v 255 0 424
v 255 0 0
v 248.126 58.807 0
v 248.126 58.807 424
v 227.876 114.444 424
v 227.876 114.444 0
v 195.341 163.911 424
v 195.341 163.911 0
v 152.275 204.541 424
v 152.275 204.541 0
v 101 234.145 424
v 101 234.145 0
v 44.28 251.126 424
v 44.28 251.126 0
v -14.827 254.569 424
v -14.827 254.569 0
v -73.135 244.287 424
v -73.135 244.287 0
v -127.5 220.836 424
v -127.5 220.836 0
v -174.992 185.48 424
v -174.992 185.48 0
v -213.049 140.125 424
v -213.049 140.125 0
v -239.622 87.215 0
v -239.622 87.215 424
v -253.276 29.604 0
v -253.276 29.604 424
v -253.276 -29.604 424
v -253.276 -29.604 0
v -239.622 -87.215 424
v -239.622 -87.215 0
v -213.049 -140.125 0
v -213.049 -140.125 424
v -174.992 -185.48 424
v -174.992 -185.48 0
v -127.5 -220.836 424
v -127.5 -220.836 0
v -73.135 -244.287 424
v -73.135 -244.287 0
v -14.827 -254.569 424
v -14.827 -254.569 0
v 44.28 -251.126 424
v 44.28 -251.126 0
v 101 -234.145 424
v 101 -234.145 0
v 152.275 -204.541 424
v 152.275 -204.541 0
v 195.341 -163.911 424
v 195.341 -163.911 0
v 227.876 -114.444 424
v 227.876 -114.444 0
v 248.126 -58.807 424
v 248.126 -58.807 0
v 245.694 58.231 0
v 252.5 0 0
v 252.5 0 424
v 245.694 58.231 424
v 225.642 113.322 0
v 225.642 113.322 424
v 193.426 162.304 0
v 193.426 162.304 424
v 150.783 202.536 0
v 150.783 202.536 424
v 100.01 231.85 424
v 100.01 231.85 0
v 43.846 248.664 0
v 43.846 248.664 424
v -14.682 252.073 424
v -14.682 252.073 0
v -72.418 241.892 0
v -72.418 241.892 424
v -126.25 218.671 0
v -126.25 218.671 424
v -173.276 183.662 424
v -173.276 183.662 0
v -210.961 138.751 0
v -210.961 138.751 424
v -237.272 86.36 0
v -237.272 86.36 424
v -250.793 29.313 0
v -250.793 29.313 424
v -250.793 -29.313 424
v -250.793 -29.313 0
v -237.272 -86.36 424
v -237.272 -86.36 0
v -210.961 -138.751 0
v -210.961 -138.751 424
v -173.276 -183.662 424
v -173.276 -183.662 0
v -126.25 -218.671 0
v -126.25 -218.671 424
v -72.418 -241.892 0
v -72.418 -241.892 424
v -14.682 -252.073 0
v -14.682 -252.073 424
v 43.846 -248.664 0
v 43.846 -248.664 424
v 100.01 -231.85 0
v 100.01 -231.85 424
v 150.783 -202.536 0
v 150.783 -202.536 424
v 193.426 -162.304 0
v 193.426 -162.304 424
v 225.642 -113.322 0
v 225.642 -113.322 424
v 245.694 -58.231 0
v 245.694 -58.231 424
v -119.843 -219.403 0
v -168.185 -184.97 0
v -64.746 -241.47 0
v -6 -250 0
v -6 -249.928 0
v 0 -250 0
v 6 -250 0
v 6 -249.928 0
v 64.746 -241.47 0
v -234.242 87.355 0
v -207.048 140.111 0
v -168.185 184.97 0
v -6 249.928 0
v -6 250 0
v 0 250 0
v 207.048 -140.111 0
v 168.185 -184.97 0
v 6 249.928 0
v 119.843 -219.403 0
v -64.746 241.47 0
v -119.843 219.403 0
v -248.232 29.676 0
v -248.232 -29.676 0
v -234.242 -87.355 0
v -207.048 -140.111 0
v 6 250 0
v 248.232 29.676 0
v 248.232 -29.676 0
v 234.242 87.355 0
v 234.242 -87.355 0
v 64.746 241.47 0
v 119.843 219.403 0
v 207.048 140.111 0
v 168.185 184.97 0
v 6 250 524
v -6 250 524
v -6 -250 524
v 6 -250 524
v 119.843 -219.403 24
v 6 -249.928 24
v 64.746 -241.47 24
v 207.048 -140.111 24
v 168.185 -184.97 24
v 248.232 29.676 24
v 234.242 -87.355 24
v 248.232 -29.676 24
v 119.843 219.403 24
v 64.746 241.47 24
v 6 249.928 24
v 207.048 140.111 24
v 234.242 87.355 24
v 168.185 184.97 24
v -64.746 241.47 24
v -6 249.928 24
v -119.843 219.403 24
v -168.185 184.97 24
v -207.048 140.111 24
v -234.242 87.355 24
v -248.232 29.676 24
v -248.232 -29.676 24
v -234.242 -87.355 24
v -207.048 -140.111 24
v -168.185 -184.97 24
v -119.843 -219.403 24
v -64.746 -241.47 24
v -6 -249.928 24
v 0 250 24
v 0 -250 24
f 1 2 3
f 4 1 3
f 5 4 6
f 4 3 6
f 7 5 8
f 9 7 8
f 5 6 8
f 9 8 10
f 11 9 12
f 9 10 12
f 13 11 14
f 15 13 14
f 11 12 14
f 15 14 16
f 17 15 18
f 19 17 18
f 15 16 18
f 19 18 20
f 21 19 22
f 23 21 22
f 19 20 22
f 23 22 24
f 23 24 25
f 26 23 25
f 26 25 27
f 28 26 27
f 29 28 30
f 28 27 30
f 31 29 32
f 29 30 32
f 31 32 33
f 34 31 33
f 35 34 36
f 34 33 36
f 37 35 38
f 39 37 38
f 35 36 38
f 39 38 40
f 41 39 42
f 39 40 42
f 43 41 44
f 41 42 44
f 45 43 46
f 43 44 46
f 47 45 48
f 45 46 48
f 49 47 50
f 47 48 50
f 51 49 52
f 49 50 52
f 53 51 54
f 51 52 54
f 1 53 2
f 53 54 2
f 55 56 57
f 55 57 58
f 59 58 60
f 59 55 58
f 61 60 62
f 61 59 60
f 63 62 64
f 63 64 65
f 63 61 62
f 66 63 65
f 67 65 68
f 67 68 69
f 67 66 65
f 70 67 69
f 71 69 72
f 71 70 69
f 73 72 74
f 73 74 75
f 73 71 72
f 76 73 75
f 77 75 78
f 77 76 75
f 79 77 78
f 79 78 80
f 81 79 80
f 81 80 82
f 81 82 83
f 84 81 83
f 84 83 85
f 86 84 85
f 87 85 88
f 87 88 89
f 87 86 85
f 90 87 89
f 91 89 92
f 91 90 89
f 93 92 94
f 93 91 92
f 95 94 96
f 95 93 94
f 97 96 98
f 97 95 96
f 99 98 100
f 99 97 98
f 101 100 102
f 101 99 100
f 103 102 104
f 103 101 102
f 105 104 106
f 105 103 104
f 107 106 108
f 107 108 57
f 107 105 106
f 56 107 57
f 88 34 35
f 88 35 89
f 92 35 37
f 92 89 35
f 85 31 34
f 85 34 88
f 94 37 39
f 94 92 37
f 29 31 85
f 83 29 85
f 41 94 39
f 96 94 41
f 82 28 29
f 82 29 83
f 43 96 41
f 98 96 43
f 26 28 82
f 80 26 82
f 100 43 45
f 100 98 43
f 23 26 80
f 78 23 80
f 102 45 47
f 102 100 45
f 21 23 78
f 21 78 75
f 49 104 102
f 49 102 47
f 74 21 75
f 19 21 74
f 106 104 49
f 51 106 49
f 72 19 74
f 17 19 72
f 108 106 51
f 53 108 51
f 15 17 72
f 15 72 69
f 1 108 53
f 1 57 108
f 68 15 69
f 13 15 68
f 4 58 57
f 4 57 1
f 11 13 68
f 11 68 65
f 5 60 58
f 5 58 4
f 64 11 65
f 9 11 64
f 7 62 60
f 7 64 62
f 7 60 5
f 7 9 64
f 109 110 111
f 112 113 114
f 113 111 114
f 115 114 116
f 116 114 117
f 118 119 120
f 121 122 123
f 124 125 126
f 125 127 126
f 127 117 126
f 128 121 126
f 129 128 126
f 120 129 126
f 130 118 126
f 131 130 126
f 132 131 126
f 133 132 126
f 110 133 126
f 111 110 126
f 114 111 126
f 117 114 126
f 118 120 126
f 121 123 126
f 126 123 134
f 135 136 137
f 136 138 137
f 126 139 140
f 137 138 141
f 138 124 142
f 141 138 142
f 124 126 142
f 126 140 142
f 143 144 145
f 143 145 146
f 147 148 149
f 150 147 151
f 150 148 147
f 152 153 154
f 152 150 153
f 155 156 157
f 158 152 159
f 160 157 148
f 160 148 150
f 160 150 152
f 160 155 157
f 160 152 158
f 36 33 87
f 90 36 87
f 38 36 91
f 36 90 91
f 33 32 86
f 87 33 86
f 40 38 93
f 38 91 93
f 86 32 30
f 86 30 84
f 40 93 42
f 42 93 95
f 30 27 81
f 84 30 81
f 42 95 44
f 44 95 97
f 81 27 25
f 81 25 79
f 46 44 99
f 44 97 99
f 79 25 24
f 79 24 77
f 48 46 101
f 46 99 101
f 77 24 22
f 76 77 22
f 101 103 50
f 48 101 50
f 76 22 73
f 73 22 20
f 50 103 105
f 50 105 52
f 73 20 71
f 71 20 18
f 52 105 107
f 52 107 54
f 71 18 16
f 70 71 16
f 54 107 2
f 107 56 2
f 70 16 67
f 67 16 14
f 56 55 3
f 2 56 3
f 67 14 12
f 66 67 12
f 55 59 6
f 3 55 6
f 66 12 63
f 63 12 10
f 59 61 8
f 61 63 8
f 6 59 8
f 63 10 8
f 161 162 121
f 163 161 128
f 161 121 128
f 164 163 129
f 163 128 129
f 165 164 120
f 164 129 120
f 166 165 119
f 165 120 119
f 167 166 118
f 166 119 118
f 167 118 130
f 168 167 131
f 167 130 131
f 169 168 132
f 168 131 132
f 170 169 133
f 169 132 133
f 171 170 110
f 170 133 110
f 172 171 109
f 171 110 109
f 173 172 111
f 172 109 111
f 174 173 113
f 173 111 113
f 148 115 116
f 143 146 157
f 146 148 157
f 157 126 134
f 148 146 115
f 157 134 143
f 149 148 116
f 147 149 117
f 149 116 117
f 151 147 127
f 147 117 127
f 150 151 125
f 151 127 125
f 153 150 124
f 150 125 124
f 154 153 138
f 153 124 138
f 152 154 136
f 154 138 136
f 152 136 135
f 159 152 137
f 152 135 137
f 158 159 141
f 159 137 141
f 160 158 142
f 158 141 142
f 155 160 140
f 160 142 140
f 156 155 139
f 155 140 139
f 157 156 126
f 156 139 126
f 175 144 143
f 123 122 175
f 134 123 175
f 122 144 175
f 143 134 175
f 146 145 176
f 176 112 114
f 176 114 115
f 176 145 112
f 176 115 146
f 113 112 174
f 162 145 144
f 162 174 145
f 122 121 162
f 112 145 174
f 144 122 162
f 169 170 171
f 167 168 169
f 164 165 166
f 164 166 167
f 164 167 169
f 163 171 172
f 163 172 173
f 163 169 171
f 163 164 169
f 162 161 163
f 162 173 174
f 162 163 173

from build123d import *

# Parameters (mm, degrees)
F0_R     = 250
F1_DEPTH = 24
F2_W     = 12
F2_H     = 500
F3_DEPTH = 524
F6_R     = 255
F6_R_2   = 252.5
F7_DEPTH = 424


# Not quite as in the source:
# - the program builds the solid bodies; features that only make, move or delete a surface that nothing else refers to are left out


with BuildPart() as f1:
    # F0 (on Top) → F1 (new body)
    with BuildSketch(Plane.XY):
        Circle(F0_R)
    extrude(amount=F1_DEPTH)

    # F2 (on Top) → F3 (join)
    with BuildSketch(Plane.XY):
        Rectangle(F2_W, F2_H)
    extrude(amount=F3_DEPTH)


with BuildPart() as f7:
    # F6 (on Top) → F7 (new body)
    with BuildSketch(Plane.XY):
        Circle(F6_R)
        Circle(F6_R_2, mode=Mode.SUBTRACT)
    extrude(amount=F7_DEPTH)


solid = Compound([f1.part, f7.part])
